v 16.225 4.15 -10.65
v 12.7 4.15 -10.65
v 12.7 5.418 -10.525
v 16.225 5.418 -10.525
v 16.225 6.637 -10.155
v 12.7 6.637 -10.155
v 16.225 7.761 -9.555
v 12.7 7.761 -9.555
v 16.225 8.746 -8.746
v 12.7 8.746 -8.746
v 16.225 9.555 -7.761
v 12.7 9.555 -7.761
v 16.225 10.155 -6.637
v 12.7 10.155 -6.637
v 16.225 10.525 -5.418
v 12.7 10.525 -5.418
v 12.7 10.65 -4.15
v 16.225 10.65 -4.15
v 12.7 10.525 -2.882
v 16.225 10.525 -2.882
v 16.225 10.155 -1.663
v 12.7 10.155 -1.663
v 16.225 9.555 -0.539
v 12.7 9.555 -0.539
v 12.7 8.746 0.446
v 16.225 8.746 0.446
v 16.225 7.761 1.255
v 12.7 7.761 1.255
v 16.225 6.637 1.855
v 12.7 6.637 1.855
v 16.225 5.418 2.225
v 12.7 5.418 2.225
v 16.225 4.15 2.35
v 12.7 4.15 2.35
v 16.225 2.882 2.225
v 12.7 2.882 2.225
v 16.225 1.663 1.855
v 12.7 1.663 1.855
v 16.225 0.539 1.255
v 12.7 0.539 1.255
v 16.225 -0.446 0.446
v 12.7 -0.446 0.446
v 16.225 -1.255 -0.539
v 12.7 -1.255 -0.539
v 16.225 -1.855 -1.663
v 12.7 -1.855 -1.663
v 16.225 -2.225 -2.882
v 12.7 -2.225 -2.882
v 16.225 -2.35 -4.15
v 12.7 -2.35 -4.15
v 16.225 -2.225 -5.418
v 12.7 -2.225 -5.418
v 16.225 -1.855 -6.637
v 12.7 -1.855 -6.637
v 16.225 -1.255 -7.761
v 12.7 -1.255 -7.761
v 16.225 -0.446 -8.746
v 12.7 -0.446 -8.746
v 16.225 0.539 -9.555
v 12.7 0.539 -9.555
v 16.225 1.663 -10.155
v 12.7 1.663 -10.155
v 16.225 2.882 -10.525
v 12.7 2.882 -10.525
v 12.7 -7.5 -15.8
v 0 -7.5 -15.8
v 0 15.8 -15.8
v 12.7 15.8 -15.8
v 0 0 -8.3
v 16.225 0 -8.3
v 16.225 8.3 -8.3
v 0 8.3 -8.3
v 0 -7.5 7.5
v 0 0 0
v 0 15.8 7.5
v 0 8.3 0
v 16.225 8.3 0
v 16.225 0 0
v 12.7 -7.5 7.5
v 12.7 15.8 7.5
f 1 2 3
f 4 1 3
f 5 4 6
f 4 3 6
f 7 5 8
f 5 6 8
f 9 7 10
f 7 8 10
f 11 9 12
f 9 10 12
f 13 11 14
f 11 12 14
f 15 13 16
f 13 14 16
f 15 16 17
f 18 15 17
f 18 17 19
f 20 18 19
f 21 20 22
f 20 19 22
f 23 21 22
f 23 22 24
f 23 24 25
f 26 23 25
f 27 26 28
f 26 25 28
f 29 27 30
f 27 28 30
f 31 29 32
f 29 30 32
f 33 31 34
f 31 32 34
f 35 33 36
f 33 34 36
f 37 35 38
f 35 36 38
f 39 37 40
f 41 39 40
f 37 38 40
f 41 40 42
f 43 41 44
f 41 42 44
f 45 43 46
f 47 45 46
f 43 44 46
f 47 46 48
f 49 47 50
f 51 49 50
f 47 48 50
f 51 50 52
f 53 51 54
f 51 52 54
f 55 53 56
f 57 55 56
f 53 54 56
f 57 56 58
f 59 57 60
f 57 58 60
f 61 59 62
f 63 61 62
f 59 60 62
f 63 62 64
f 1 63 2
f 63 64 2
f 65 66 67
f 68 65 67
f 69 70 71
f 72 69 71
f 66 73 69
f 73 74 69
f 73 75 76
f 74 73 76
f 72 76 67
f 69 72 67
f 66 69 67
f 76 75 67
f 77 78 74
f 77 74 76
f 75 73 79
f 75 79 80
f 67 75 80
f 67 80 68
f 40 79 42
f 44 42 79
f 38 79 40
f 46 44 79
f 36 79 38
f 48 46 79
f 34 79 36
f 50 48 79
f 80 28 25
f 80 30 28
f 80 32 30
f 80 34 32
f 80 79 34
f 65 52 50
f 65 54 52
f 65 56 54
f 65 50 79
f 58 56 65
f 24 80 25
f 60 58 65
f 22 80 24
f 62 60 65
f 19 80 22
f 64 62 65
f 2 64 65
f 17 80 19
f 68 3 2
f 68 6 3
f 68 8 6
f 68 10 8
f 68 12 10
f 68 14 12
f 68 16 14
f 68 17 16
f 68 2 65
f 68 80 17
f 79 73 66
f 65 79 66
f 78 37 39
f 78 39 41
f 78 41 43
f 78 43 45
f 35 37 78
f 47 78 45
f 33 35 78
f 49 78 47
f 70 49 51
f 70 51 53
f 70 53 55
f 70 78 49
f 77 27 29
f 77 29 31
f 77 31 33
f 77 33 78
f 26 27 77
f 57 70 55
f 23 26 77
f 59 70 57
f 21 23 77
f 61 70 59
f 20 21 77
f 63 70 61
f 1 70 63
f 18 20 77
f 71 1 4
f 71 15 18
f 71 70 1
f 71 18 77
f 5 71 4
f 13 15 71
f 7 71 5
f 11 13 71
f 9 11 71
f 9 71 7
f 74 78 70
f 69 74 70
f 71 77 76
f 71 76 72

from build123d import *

# Parameters (mm, degrees)
SKETCH2_W           = 23.3
SKETCH2_H           = 23.3
SKETCH2_W_2         = 8.3
SKETCH2_H_2         = 8.3
EXTRUDE_THIN1_DEPTH = 12.7
SKETCH3_R           = 6.5
SKETCH3_W           = 8.3
SKETCH3_H           = 8.3
BOSS_EXTRUDE1_DEPTH = 3.525


with BuildPart() as part:
    # Sketch2 → Extrude-Thin1 (new body)
    with BuildSketch(Plane(origin=(0, 0, 0), x_dir=(0, 0, -1), z_dir=(1, 0, 0))):
        with Locations((4.15, 4.15)):
            Rectangle(SKETCH2_W, SKETCH2_H)
        with Locations((4.15, 4.15)):
            Rectangle(SKETCH2_W_2, SKETCH2_H_2, mode=Mode.SUBTRACT)
    extrude(amount=EXTRUDE_THIN1_DEPTH)

    # Sketch3 → Boss-Extrude1 (add)
    with BuildSketch(Plane(origin=(12.7, 0, 0), x_dir=(0, 0, -1), z_dir=(1, 0, 0))):
        with Locations((4.15, 4.15)):
            Circle(SKETCH3_R)
        with Locations((4.15, 4.15)):
            Rectangle(SKETCH3_W, SKETCH3_H, mode=Mode.SUBTRACT)
    extrude(amount=BOSS_EXTRUDE1_DEPTH)


solid = part.part
